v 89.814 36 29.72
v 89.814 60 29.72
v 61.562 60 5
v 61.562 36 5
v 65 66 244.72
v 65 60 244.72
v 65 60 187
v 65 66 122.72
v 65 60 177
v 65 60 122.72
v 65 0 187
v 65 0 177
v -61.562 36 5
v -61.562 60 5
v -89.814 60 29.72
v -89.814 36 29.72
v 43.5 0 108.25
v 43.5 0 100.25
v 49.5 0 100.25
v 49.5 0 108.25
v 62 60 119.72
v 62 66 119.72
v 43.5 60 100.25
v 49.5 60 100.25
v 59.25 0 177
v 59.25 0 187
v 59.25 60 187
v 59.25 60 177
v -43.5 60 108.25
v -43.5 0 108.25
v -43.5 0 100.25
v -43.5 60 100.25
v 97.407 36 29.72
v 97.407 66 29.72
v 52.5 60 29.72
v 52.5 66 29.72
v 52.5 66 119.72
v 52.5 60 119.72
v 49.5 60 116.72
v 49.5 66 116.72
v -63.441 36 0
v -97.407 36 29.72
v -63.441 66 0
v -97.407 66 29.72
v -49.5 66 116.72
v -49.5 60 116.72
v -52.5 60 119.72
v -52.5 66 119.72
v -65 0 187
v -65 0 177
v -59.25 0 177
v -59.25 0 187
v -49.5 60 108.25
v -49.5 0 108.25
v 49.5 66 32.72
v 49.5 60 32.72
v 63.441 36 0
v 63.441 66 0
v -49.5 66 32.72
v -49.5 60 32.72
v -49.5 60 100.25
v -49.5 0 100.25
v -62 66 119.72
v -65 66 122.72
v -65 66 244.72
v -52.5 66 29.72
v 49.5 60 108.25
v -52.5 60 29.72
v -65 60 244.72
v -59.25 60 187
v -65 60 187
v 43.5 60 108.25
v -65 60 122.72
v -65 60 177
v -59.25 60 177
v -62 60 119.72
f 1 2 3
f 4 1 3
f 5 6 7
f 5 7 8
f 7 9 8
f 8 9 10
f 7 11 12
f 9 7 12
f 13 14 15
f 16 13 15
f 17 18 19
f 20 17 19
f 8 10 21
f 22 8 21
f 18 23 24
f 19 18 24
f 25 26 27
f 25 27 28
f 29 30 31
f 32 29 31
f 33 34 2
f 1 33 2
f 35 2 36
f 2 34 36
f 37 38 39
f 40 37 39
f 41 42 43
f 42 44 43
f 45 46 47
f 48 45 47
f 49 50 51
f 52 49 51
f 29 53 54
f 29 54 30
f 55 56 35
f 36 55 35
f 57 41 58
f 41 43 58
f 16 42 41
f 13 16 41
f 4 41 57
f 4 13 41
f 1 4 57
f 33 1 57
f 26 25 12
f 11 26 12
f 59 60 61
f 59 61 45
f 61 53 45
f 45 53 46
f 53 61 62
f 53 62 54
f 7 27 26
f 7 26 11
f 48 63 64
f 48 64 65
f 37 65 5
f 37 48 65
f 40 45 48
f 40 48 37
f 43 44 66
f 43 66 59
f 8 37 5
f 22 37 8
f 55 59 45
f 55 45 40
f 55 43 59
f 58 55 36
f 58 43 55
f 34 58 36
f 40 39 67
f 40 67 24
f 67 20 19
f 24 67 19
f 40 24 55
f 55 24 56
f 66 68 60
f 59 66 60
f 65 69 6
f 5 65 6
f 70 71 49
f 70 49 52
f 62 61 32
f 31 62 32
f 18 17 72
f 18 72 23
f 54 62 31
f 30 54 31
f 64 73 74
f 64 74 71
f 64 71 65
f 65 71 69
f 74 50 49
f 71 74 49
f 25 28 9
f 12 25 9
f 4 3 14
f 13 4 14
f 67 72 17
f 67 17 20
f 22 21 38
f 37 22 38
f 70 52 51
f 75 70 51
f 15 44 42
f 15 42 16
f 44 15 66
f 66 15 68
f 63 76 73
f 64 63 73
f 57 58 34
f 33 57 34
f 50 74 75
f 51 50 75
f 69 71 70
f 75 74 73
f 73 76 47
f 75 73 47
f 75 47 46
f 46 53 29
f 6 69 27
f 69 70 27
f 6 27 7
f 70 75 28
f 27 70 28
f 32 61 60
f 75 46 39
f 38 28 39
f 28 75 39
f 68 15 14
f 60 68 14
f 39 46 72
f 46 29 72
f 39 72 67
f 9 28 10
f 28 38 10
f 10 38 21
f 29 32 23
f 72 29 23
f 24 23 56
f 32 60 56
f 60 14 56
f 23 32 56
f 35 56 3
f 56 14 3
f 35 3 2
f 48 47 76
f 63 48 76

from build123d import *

# Parameters (mm, degrees)
SKETCH1_W             = 6
SKETCH1_H             = 8
BOSS_EXTRUDE1_DEPTH   = 60
SKETCH1_W_2           = 5.75
SKETCH1_H_2           = 10
BOSS_EXTRUDE1_2_DEPTH = 60
BOSS_EXTRUDE1_3_DEPTH = 60
BOSS_EXTRUDE1_4_DEPTH = 60
BOSS_EXTRUDE2_DEPTH   = 6
BOSS_EXTRUDE3_DEPTH   = 24


with BuildPart() as part:
    # Sketch1 → Boss-Extrude1 (new body)
    with BuildSketch(Plane(origin=(0, 0, 0), x_dir=(1, 0, 0), z_dir=(0, 1, 0))):
        with Locations((-46.5, -104.25)):
            Rectangle(SKETCH1_W, SKETCH1_H)
    extrude(amount=BOSS_EXTRUDE1_DEPTH)



with BuildPart() as body_2:
    # Sketch1 → Boss-Extrude1 2 (new body)
    with BuildSketch(Plane(origin=(0, 0, 0), x_dir=(1, 0, 0), z_dir=(0, 1, 0))):
        with Locations((-62.125, -182)):
            Rectangle(SKETCH1_W_2, SKETCH1_H_2)
    extrude(amount=BOSS_EXTRUDE1_2_DEPTH)


with BuildPart() as body_3:
    # Sketch1 → Boss-Extrude1 3 (new body)
    with BuildSketch(Plane(origin=(0, 0, 0), x_dir=(1, 0, 0), z_dir=(0, 1, 0))):
        with Locations((62.125, -182)):
            Rectangle(SKETCH1_W_2, SKETCH1_H_2)
    extrude(amount=BOSS_EXTRUDE1_3_DEPTH)


with BuildPart() as body_4:
    # Sketch1 → Boss-Extrude1 4 (new body)
    with BuildSketch(Plane(origin=(0, 0, 0), x_dir=(1, 0, 0), z_dir=(0, 1, 0))):
        with Locations((46.5, -104.25)):
            Rectangle(SKETCH1_W, SKETCH1_H)
    extrude(amount=BOSS_EXTRUDE1_4_DEPTH)


with BuildPart() as part_1:
    add(part.part)

    add(body_2.part)  # Boss-Extrude2 merges body 2

    add(body_3.part)  # Boss-Extrude2 merges body 3

    add(body_4.part)  # Boss-Extrude2 merges body 4
    # Sketch2 → Boss-Extrude2 (add)
    with BuildSketch(Plane(origin=(0, 60, 0), x_dir=(1, 0, 0), z_dir=(0, 1, 0))):
        Polygon((-52.5, -119.720396317), (-62, -119.720396317), (-65, -122.720396317), (-65, -244.720396317), (65, -244.720396317), (65, -122.720396317), (62, -119.720396317), (52.5, -119.720396317), (49.5, -116.720396317), (49.5, -32.720396317), (52.5, -29.720396317), (97.407038705, -29.720396317), (63.440871486, 0), (-63.440871486, 0), (-97.407038705, -29.720396317), (-52.5, -29.720396317), (-49.5, -32.720396317), (-49.5, -116.720396317), align=None)
    extrude(amount=BOSS_EXTRUDE2_DEPTH)

    # Sketch4 → Boss-Extrude3 (add)
    with BuildSketch(Plane.XZ.offset(-60)):
        Polygon((89.81407741, 29.720396317), (61.562195905, 5), (-61.562195905, 5), (-89.81407741, 29.720396317), (-97.407038705, 29.720396317), (-63.440871486, 0), (63.440871486, 0), (97.407038705, 29.720396317), align=None)
    extrude(amount=BOSS_EXTRUDE3_DEPTH)


solid = part_1.part
